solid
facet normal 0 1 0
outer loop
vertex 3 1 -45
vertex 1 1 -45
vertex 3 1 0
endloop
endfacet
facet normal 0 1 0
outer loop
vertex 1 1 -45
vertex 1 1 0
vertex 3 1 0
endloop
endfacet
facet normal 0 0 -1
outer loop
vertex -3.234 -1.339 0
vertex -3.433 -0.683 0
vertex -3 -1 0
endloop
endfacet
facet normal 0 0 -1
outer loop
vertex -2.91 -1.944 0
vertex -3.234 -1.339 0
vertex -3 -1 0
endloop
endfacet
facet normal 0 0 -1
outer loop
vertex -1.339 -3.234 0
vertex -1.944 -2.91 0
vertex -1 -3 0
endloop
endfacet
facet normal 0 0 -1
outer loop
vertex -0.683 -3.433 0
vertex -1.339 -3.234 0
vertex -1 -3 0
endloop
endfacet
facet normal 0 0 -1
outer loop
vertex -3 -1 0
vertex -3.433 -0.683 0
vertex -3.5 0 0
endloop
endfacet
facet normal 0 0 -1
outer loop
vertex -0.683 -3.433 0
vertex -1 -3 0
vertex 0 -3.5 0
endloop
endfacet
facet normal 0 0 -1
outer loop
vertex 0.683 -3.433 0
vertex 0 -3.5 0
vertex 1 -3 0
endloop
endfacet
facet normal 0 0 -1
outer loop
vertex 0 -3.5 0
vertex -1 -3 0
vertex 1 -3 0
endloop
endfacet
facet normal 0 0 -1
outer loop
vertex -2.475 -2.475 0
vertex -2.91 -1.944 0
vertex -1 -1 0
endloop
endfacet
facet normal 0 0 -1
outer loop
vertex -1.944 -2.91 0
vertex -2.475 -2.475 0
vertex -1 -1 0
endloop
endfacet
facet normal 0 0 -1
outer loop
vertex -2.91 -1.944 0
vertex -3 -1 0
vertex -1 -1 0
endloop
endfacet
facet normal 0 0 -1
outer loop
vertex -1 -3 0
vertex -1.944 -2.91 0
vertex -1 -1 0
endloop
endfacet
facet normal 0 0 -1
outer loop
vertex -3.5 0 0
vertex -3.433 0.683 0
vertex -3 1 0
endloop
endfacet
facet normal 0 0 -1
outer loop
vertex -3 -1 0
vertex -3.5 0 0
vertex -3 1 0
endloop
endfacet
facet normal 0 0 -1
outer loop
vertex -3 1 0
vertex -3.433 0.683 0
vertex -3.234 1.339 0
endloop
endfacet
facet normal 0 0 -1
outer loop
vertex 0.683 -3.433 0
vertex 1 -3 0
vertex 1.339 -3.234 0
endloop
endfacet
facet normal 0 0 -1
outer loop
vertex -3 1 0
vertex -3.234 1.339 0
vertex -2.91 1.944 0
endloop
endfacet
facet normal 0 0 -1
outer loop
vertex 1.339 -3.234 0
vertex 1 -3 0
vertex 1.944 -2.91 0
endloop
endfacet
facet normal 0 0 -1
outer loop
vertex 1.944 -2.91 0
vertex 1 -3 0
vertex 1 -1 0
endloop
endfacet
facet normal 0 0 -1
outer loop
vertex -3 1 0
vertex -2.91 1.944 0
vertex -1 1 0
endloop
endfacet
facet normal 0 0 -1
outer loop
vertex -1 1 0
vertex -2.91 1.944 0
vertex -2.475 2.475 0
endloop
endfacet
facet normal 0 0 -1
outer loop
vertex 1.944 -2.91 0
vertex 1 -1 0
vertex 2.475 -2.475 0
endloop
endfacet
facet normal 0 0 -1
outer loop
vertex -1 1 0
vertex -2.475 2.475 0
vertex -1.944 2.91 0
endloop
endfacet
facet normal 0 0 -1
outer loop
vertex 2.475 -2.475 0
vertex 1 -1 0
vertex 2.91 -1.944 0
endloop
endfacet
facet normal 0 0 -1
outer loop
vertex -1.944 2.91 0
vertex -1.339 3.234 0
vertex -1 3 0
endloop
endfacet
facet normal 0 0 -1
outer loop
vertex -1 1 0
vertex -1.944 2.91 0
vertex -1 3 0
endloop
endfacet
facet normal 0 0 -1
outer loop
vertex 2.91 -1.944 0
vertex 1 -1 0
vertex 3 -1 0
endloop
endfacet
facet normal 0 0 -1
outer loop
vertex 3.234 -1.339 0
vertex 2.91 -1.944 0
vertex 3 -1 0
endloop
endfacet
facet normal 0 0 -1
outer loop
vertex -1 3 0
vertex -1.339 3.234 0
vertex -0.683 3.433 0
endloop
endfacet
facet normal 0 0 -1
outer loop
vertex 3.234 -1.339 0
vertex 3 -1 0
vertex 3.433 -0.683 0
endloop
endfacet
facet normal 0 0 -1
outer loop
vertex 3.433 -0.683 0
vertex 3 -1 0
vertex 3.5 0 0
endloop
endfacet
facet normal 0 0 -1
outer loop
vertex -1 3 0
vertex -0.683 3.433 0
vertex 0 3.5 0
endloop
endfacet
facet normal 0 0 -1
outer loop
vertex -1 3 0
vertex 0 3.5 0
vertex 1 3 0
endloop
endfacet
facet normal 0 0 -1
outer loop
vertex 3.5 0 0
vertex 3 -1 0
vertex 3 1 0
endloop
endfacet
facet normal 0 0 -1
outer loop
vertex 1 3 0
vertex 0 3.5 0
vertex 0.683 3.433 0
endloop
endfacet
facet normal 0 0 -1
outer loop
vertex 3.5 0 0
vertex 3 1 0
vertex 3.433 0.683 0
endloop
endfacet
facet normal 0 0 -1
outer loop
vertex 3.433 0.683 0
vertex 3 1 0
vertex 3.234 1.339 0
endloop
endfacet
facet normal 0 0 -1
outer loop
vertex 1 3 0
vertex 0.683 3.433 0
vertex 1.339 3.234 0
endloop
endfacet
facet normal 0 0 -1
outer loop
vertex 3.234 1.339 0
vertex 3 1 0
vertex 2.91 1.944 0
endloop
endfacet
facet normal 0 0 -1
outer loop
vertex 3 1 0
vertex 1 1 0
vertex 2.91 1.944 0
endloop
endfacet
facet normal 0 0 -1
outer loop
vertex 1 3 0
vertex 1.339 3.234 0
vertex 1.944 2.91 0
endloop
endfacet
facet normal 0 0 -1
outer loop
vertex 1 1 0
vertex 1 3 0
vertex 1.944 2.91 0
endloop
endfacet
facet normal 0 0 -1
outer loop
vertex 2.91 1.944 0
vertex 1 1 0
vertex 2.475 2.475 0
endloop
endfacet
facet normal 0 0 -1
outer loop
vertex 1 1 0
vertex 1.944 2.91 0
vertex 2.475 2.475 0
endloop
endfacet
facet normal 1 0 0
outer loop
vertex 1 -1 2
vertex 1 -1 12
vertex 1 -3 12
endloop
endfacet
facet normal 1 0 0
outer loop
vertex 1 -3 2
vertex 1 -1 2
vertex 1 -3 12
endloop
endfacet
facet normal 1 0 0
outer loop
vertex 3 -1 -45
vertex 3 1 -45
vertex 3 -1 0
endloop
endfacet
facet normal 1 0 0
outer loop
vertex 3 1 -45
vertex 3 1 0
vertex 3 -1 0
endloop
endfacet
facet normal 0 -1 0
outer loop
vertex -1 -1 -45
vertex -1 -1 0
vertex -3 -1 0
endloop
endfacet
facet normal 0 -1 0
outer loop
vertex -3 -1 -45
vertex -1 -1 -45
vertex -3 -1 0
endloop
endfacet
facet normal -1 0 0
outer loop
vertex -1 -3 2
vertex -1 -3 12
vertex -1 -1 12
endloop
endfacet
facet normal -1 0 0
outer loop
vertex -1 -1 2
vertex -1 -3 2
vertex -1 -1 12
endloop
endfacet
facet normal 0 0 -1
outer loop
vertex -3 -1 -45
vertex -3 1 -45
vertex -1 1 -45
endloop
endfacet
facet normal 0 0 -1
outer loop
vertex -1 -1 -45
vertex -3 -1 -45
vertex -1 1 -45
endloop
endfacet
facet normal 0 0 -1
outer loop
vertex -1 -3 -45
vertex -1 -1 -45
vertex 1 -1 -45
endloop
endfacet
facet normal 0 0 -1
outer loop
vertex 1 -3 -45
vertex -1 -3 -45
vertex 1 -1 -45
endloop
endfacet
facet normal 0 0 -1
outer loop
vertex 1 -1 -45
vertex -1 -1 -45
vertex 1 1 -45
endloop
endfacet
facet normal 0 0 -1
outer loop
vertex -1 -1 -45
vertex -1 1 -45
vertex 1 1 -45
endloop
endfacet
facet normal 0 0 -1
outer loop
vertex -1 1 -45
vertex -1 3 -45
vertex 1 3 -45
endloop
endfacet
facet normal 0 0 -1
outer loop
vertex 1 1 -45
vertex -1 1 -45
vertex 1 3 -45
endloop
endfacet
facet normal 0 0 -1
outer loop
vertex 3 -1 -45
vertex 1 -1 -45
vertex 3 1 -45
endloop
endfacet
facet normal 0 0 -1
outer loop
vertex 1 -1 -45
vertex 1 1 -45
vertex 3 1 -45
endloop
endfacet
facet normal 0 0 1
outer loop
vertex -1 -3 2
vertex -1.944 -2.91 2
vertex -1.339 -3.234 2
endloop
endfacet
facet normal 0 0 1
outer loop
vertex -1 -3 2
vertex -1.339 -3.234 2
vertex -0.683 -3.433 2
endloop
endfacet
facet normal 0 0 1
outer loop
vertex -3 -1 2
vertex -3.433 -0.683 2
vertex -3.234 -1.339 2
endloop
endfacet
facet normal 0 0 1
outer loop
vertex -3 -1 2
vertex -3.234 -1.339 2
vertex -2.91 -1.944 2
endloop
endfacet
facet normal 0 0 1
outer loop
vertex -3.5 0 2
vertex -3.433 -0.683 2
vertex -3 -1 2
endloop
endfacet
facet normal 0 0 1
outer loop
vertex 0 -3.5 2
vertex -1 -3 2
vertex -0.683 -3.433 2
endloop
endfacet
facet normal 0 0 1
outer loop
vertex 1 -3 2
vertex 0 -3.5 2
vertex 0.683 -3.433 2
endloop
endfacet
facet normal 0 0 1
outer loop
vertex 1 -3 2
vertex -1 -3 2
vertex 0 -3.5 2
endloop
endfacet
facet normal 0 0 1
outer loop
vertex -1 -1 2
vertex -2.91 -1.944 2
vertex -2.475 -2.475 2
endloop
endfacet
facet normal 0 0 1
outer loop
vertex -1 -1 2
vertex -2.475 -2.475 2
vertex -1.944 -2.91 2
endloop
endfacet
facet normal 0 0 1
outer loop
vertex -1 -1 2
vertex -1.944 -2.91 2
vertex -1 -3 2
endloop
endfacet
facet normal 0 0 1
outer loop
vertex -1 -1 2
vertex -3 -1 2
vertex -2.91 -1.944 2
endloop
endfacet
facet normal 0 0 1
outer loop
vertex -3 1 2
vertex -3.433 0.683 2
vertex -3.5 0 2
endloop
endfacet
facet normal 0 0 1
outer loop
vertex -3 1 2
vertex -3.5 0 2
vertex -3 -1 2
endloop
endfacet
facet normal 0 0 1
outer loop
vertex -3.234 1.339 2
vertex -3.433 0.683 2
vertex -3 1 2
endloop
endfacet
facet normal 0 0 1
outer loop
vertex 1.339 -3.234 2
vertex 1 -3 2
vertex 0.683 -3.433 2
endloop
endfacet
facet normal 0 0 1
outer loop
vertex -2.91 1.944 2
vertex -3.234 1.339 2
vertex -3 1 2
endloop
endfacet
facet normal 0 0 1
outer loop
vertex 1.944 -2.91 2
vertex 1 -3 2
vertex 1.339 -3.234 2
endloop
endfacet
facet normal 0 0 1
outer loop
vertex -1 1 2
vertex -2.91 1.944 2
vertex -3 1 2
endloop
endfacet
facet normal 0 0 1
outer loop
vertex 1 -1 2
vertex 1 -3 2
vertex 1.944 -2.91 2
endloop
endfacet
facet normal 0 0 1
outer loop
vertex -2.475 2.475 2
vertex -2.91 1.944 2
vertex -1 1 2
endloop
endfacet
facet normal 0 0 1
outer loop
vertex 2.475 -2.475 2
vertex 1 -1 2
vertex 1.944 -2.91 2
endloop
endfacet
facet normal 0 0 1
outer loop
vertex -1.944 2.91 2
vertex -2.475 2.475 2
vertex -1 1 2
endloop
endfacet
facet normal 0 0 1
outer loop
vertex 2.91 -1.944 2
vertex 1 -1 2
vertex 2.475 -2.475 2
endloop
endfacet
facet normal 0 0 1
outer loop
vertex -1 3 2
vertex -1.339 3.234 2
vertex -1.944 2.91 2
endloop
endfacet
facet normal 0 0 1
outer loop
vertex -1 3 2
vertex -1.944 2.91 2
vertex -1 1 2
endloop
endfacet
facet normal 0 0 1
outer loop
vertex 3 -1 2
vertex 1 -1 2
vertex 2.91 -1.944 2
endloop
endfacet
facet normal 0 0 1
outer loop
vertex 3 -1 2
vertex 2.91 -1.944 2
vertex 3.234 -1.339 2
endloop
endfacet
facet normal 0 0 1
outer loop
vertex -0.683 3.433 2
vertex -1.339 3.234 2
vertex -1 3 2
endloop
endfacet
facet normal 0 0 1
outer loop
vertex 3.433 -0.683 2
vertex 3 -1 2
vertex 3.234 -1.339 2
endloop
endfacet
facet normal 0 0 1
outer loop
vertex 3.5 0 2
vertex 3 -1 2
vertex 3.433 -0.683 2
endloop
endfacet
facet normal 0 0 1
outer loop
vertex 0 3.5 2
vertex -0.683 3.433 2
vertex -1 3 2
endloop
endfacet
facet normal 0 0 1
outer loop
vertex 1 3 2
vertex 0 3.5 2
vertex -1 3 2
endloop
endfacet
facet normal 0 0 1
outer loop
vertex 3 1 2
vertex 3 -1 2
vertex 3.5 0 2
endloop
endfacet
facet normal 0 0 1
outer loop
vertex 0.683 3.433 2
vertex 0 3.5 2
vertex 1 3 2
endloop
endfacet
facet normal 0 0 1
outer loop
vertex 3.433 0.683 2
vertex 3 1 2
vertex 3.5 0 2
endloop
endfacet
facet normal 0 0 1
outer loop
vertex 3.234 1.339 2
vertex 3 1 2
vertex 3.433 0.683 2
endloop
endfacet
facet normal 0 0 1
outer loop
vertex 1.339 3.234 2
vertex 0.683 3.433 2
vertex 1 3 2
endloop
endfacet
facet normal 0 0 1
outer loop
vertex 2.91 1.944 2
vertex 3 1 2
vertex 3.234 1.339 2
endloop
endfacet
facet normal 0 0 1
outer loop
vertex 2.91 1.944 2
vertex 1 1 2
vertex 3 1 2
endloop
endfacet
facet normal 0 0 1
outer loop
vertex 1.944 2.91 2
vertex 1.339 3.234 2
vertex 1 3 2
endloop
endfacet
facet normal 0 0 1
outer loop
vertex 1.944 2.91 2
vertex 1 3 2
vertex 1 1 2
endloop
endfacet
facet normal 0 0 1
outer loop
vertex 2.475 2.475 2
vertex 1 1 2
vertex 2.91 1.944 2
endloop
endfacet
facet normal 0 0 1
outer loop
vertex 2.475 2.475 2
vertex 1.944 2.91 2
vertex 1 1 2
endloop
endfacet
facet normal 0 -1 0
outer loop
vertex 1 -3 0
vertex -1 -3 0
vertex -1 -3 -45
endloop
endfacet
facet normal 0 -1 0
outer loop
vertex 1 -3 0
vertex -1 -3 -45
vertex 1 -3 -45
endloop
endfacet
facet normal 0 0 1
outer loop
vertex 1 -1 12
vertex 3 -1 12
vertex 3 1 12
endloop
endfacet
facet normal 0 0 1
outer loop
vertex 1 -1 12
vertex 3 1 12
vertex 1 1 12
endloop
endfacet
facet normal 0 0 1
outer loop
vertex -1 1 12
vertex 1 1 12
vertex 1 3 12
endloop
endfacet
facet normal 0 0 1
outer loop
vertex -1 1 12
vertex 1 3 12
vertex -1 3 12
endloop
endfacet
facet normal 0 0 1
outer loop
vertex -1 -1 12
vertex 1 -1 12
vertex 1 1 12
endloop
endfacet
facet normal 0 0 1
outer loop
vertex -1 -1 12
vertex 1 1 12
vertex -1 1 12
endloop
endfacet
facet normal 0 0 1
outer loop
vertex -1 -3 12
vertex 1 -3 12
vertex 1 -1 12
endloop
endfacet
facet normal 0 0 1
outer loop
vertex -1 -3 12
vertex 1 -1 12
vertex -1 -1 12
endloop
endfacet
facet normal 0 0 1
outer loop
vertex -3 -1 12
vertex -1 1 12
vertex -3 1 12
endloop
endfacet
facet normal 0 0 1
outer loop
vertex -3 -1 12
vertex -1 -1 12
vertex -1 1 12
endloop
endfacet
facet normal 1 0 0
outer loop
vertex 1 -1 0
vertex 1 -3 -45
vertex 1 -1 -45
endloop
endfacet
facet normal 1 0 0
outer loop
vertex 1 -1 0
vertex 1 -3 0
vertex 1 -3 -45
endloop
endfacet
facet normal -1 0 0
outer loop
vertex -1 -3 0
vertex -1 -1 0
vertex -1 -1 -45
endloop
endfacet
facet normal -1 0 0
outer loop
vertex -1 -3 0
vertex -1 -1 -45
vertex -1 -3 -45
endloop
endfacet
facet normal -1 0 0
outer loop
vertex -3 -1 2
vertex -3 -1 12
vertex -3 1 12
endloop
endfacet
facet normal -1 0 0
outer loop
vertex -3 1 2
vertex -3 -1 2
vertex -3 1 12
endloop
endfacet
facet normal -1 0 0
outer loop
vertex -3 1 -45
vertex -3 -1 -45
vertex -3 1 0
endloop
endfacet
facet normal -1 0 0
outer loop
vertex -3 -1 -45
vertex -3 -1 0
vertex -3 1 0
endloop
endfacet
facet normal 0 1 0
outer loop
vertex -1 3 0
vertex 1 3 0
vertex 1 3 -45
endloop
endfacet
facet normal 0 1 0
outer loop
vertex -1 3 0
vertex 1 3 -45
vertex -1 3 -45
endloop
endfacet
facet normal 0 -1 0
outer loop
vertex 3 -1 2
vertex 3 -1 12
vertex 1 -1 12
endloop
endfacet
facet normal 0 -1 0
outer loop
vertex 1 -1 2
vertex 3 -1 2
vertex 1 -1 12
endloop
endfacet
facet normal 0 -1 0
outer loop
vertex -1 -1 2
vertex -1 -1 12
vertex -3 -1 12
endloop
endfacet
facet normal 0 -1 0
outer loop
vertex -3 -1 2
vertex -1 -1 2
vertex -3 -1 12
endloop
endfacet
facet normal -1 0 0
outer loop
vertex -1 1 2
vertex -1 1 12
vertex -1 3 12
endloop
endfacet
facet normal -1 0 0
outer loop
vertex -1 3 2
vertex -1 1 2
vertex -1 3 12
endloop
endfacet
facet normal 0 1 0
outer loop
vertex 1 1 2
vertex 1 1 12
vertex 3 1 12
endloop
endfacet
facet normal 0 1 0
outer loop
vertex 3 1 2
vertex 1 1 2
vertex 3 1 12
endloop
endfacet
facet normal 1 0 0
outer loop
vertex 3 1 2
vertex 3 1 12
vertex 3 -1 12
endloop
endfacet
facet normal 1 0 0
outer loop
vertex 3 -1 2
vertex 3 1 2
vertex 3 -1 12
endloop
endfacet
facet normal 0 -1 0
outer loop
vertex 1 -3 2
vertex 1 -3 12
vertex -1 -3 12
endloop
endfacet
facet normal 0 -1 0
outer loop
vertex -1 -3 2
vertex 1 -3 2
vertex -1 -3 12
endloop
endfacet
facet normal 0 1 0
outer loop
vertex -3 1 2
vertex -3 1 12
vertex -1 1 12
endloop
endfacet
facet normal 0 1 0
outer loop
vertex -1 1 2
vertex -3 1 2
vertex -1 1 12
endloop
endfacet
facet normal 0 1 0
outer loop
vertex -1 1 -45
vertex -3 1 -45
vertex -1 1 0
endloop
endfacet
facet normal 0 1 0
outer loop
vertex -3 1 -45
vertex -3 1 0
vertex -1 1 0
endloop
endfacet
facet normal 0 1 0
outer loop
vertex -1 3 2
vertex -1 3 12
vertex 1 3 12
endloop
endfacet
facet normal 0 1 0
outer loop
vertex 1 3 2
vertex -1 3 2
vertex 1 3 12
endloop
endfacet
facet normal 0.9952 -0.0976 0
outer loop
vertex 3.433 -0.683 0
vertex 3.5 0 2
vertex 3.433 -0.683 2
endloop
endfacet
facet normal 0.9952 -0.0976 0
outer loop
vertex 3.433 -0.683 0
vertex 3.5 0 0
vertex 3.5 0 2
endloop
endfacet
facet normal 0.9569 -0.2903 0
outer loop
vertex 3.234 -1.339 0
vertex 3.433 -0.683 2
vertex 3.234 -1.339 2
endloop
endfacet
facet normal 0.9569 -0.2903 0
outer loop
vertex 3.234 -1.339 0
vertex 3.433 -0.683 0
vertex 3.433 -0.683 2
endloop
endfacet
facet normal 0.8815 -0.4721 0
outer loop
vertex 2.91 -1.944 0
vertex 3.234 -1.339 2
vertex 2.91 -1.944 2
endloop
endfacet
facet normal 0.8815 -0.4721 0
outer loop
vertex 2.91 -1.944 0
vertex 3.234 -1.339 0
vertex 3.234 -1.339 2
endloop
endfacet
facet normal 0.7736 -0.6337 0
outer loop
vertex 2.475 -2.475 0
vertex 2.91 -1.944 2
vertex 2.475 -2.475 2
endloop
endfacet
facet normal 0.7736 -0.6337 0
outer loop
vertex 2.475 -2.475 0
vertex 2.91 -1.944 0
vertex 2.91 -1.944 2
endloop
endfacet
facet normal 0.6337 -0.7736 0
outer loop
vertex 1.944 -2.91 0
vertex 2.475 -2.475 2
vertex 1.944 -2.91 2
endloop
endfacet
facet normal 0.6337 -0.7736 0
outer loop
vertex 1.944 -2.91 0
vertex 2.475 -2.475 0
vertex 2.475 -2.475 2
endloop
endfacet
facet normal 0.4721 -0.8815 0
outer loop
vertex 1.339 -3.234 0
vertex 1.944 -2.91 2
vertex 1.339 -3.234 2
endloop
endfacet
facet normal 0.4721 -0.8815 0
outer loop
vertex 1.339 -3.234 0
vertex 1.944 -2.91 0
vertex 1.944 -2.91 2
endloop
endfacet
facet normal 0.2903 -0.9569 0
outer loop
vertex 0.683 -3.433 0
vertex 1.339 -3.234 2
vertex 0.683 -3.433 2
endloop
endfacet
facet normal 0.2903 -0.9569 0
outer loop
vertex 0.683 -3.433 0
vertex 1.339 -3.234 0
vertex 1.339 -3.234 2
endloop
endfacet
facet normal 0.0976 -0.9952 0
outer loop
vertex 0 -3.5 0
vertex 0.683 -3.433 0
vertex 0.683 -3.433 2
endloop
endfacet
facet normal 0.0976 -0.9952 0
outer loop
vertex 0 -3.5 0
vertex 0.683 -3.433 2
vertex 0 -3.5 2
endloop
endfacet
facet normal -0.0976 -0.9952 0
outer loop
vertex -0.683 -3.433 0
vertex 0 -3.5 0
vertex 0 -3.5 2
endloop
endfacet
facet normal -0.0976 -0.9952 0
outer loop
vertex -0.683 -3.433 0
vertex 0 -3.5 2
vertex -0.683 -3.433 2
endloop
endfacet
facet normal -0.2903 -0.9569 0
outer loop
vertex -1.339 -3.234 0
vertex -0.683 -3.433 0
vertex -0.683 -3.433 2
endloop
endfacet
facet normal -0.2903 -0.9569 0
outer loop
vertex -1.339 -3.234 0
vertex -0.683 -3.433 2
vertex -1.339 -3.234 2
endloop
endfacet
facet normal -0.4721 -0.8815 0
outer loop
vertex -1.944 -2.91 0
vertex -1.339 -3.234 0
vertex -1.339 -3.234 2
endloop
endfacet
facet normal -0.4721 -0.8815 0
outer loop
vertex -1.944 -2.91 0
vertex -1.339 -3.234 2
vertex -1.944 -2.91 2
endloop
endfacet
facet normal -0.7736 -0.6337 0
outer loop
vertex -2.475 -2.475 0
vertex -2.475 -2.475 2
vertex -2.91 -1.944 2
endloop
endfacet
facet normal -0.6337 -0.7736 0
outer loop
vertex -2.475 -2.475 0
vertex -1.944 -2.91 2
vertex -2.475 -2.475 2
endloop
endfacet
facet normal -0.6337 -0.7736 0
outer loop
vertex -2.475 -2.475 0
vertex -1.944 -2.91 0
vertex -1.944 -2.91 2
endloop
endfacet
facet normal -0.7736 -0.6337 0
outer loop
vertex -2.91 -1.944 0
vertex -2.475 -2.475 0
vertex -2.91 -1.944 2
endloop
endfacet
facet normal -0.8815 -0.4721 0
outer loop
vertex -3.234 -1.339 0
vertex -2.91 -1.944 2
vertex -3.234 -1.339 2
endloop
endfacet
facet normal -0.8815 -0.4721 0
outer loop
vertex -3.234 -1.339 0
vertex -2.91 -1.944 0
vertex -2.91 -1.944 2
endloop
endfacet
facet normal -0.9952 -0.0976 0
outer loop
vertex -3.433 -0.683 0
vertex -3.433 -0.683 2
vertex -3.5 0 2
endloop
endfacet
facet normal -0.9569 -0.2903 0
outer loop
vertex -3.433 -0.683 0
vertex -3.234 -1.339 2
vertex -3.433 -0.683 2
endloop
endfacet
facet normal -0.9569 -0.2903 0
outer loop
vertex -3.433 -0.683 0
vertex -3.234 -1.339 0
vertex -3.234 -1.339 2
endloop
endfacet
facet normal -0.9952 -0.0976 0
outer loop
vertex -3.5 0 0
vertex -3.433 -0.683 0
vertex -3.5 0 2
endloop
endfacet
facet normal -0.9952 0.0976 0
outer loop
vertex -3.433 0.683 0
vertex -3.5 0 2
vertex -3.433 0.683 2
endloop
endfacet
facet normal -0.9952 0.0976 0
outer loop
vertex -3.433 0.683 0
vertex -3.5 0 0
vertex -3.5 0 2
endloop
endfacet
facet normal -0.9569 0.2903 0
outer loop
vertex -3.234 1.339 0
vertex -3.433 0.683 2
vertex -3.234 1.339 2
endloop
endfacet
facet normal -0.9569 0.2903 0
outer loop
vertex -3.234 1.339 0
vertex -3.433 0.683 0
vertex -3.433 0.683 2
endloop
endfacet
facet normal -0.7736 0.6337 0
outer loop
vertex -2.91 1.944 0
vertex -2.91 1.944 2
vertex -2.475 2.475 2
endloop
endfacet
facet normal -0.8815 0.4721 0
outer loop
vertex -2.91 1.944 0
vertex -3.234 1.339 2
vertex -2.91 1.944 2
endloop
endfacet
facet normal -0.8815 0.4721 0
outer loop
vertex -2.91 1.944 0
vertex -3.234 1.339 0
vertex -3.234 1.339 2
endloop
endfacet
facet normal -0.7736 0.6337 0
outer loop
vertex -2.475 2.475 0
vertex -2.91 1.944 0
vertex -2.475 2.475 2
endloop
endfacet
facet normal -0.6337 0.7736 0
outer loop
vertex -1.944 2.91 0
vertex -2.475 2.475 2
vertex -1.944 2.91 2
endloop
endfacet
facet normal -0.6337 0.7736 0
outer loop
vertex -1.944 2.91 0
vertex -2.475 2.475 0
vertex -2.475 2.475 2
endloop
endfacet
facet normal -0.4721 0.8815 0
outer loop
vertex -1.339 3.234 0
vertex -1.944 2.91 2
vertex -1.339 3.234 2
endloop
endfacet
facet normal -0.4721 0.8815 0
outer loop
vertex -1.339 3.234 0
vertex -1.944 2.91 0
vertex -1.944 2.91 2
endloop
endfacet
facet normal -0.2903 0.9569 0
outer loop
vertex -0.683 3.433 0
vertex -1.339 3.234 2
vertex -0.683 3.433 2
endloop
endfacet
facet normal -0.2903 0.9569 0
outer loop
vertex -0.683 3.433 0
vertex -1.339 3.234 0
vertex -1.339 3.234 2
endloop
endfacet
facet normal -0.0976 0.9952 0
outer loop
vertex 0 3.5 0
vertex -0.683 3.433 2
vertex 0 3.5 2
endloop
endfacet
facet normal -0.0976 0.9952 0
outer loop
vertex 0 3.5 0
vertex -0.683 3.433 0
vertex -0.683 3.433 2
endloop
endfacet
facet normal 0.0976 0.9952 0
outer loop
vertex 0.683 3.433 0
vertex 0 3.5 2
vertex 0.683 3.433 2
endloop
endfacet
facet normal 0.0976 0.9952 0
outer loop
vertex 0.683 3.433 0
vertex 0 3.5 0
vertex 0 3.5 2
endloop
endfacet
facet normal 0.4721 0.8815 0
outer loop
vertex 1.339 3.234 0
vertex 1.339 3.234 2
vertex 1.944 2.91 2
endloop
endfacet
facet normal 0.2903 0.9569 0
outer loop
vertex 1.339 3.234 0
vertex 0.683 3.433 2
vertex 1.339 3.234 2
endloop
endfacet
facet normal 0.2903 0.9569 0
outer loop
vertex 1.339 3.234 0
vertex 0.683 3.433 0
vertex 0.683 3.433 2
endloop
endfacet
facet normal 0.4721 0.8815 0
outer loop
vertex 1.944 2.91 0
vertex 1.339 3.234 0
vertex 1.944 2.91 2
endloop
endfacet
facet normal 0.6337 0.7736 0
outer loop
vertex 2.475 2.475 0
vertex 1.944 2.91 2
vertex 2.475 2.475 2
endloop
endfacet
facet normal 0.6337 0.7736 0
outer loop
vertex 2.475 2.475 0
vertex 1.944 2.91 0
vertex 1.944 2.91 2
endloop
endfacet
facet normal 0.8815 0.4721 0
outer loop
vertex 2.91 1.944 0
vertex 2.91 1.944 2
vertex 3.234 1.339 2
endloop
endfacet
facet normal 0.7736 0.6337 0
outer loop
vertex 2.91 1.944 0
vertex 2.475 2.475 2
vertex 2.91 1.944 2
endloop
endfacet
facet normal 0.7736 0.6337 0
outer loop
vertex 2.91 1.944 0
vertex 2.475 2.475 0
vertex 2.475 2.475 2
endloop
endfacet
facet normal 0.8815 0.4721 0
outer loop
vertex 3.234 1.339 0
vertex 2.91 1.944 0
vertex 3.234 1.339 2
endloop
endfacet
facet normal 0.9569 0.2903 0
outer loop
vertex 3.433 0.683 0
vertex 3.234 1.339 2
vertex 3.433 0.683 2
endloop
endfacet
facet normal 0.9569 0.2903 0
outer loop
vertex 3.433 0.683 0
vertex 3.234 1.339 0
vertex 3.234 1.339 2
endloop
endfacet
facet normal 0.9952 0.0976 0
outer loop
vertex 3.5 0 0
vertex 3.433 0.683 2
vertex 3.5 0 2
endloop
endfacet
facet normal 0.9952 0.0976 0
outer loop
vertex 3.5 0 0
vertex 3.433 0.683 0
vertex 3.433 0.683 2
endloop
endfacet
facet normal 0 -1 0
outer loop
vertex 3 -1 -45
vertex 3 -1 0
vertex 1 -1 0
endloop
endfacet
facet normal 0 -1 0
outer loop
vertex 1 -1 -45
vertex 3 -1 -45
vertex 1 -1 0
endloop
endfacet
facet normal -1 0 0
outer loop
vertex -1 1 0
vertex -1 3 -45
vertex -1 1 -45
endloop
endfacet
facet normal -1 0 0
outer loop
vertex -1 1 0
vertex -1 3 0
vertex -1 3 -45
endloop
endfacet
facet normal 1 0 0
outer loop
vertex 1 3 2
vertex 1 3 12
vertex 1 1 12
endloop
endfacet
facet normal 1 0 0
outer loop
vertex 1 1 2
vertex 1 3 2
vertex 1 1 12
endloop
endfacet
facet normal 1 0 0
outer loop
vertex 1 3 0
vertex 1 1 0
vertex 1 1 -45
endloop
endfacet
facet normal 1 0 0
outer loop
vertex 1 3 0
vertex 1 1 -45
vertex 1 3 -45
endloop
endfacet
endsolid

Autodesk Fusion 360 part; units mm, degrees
sketch "Sketch1" plane through (0, 0, 0) normal (0, 0, 1) x (1, 0, 0)
  circle A0 centre (0, 0) radius 3.5
  dimension "d1" = 7
extrude "Extrude1" add sketch "Sketch1" along normal blind 2
sketch "Sketch2" plane through (0, 0, 2) normal (0, 0, 1) x (-1, 0, 0)
  circle A0 centre (0, 0) radius 3.5
  line L0 (-1, 3) -> (1, 3)
  line L1 (1, -3) -> (-1, -3)
  line L2 (-3, -1) -> (-3, 1)
  line L3 (3, 1) -> (3, -1)
  line L4 (1, 3) -> (1, 1)
  line L5 (1, -1) -> (1, -3)
  line L6 (3, -1) -> (1, -1)
  line L7 (-1, -1) -> (-3, -1)
  line L8 (-1, -3) -> (-1, -1)
  line L9 (-1, 1) -> (-1, 3)
  line L10 (-3, 1) -> (-1, 1)
  line L11 (1, 1) -> (3, 1)
  dimension "d4" = 2
  dimension "d5" = 6
  dimension "d6" = 6
  dimension "d7" = 2
extrude "Extrude2" add sketch "Sketch2" along normal blind 10 contours L0 L1 L2 L3 L4 L5 L6 L7 L8 L9 L10 L11
sketch "Sketch3" plane through (0, 0, 0) normal (0, 0, 1) x (1, 0, 0)
  line L0 (1, 3) -> (-1, 3)
  line L1 (-1, -3) -> (1, -3)
  line L2 (3, 1) -> (3, -1)
  line L3 (-3, -1) -> (-3, 1)
  line L4 (-1, 3) -> (-1, 1)
  line L5 (-1, -1) -> (-1, -3)
  line L6 (3, -1) -> (1, -1)
  line L7 (-1, -1) -> (-3, -1)
  line L8 (1, -3) -> (1, -1)
  line L9 (1, 1) -> (1, 3)
  line L10 (-3, 1) -> (-1, 1)
  line L11 (1, 1) -> (3, 1)
  dimension "d10" = 2
  dimension "d11" = 6
  dimension "d12" = 6
  dimension "d13" = 2
extrude "Extrude3" add sketch "Sketch3" against normal blind 45
